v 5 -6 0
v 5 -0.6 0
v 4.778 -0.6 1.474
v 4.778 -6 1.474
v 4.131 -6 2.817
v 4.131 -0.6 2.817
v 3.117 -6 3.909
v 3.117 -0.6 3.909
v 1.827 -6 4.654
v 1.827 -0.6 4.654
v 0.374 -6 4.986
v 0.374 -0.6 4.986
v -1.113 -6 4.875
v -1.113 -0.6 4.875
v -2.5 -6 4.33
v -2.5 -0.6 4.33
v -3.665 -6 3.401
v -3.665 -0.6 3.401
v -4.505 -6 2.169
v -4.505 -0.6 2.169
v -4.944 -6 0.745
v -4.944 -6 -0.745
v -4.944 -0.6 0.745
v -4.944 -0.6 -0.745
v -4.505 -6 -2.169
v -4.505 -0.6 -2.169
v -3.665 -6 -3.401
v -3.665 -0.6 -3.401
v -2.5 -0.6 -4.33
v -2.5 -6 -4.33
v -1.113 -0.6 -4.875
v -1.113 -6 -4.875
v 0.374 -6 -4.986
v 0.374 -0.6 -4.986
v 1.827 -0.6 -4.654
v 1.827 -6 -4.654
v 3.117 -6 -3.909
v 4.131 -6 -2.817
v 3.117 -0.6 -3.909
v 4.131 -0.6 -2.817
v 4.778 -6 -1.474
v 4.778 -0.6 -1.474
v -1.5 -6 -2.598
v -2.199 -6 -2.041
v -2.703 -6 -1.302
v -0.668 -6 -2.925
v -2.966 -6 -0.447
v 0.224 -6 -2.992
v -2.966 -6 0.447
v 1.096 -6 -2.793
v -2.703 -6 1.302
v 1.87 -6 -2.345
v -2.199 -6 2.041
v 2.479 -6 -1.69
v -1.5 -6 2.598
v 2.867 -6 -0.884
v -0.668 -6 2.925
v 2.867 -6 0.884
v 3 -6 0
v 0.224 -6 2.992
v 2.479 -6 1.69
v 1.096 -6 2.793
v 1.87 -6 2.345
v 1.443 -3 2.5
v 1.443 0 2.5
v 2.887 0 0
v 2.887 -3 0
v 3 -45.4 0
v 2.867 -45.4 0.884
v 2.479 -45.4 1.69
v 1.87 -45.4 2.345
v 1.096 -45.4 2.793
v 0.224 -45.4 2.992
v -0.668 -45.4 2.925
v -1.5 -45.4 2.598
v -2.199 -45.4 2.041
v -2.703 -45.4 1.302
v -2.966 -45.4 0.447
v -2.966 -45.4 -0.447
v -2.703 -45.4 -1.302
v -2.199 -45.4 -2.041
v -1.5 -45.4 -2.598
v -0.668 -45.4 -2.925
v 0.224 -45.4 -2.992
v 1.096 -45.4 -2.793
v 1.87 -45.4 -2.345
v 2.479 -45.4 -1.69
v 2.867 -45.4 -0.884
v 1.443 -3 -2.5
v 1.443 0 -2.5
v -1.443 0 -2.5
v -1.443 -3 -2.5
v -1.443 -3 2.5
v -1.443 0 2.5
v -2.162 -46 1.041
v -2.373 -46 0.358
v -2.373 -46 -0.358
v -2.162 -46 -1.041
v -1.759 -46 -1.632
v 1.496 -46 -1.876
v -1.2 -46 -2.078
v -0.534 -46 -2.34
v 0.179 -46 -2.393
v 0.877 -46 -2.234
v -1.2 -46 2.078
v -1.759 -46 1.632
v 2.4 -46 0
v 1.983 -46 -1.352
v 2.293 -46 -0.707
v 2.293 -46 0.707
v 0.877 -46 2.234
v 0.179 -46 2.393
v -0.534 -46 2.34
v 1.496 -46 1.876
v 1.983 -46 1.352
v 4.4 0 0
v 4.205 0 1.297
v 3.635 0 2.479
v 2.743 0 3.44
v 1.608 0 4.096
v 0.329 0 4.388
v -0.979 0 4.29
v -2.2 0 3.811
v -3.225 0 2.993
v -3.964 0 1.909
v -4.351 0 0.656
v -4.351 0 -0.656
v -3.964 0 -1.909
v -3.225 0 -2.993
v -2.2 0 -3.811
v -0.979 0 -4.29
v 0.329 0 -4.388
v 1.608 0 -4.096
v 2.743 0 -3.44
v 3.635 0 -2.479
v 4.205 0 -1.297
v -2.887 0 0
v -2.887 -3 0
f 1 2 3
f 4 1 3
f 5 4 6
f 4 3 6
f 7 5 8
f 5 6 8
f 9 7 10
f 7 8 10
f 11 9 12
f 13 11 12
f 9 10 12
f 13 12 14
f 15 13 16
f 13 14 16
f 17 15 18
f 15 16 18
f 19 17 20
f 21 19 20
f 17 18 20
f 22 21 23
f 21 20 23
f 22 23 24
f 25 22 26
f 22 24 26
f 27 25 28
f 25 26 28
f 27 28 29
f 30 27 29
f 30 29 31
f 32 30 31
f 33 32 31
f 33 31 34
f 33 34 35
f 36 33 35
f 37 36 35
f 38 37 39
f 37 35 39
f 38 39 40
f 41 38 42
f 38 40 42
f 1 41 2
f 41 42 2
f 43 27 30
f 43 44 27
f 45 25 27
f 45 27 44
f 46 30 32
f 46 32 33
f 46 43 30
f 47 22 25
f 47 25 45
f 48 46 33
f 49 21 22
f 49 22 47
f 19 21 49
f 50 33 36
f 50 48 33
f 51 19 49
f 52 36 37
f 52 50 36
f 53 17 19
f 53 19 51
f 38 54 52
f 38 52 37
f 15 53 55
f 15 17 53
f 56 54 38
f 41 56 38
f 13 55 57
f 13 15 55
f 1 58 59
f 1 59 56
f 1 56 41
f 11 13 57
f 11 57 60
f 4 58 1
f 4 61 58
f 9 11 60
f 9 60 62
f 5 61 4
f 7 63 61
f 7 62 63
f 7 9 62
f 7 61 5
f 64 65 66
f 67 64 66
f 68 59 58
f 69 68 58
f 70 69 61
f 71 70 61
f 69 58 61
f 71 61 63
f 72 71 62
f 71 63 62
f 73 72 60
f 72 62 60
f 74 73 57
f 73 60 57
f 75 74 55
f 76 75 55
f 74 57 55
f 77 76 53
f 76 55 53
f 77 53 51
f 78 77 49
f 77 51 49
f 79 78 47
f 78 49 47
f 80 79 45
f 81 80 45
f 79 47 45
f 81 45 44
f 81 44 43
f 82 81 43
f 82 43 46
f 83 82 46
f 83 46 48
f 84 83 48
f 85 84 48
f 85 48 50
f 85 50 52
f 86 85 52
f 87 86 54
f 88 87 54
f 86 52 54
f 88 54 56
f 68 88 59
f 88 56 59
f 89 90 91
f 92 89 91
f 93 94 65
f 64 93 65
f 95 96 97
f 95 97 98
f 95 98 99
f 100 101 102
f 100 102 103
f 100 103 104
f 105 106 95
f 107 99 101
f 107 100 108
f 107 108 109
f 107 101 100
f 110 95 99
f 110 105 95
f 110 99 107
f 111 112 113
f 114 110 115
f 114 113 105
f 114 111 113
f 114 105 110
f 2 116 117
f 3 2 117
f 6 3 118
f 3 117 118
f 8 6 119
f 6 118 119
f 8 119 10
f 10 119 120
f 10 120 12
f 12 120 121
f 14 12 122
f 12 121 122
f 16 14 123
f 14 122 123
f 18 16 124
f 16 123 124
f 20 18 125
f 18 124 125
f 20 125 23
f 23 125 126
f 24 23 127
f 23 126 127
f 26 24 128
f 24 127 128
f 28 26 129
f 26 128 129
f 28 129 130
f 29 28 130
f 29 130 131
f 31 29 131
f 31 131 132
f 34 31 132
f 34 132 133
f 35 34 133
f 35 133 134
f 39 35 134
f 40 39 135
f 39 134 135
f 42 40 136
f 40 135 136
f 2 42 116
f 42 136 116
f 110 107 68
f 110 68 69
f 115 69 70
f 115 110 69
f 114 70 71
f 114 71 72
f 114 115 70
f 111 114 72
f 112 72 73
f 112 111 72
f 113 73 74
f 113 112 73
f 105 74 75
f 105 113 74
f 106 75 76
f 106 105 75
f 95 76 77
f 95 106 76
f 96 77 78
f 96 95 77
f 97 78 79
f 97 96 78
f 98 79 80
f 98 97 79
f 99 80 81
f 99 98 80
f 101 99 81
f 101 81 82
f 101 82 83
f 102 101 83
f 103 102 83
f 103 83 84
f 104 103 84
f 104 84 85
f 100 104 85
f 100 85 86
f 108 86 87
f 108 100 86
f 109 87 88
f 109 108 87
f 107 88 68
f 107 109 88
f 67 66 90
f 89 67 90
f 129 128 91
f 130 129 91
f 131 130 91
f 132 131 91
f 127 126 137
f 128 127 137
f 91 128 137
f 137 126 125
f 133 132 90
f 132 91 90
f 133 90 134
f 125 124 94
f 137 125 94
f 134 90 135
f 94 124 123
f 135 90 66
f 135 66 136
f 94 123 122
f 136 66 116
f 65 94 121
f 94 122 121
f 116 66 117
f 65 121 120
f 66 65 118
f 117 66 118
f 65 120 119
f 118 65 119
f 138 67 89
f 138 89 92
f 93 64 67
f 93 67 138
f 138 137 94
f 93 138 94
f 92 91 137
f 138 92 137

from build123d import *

# Parameters (mm, degrees)
F0_R     = 5
F1_DEPTH = 6
F2_R     = 3
F3_DEPTH = 40
F5_DEPTH = 3
F6_SIZE  = 0.6


with BuildPart() as f1:
    # F0 (on Front) → F1 (new body)
    with BuildSketch(Plane.XZ):
        Circle(F0_R)
    extrude(amount=F1_DEPTH)

    # F2 (on face) → F3 (join)
    with BuildSketch(Plane.XZ.offset(6)):
        Circle(F2_R)
    extrude(amount=F3_DEPTH)

    # F4 (on face) → F5 (cut)
    with BuildSketch(Plane(origin=(0, 0, 0), x_dir=(-1, 0, 0), z_dir=(0, 1, 0))):
        Polygon((1.443376, 2.5), (-1.443376, 2.5), (-2.886751, 0), (-1.443376, -2.5), (1.443376, -2.5), (2.886751, 0), align=None)
    extrude(amount=-F5_DEPTH, mode=Mode.SUBTRACT)

    # F6
    f6_edges = [f1.edges().sort_by_distance(p)[0] for p in [
        (-5, 0, 0),
        (-3, -46, 0),
    ]]
    chamfer(f6_edges, length=F6_SIZE)


solid = f1.part
